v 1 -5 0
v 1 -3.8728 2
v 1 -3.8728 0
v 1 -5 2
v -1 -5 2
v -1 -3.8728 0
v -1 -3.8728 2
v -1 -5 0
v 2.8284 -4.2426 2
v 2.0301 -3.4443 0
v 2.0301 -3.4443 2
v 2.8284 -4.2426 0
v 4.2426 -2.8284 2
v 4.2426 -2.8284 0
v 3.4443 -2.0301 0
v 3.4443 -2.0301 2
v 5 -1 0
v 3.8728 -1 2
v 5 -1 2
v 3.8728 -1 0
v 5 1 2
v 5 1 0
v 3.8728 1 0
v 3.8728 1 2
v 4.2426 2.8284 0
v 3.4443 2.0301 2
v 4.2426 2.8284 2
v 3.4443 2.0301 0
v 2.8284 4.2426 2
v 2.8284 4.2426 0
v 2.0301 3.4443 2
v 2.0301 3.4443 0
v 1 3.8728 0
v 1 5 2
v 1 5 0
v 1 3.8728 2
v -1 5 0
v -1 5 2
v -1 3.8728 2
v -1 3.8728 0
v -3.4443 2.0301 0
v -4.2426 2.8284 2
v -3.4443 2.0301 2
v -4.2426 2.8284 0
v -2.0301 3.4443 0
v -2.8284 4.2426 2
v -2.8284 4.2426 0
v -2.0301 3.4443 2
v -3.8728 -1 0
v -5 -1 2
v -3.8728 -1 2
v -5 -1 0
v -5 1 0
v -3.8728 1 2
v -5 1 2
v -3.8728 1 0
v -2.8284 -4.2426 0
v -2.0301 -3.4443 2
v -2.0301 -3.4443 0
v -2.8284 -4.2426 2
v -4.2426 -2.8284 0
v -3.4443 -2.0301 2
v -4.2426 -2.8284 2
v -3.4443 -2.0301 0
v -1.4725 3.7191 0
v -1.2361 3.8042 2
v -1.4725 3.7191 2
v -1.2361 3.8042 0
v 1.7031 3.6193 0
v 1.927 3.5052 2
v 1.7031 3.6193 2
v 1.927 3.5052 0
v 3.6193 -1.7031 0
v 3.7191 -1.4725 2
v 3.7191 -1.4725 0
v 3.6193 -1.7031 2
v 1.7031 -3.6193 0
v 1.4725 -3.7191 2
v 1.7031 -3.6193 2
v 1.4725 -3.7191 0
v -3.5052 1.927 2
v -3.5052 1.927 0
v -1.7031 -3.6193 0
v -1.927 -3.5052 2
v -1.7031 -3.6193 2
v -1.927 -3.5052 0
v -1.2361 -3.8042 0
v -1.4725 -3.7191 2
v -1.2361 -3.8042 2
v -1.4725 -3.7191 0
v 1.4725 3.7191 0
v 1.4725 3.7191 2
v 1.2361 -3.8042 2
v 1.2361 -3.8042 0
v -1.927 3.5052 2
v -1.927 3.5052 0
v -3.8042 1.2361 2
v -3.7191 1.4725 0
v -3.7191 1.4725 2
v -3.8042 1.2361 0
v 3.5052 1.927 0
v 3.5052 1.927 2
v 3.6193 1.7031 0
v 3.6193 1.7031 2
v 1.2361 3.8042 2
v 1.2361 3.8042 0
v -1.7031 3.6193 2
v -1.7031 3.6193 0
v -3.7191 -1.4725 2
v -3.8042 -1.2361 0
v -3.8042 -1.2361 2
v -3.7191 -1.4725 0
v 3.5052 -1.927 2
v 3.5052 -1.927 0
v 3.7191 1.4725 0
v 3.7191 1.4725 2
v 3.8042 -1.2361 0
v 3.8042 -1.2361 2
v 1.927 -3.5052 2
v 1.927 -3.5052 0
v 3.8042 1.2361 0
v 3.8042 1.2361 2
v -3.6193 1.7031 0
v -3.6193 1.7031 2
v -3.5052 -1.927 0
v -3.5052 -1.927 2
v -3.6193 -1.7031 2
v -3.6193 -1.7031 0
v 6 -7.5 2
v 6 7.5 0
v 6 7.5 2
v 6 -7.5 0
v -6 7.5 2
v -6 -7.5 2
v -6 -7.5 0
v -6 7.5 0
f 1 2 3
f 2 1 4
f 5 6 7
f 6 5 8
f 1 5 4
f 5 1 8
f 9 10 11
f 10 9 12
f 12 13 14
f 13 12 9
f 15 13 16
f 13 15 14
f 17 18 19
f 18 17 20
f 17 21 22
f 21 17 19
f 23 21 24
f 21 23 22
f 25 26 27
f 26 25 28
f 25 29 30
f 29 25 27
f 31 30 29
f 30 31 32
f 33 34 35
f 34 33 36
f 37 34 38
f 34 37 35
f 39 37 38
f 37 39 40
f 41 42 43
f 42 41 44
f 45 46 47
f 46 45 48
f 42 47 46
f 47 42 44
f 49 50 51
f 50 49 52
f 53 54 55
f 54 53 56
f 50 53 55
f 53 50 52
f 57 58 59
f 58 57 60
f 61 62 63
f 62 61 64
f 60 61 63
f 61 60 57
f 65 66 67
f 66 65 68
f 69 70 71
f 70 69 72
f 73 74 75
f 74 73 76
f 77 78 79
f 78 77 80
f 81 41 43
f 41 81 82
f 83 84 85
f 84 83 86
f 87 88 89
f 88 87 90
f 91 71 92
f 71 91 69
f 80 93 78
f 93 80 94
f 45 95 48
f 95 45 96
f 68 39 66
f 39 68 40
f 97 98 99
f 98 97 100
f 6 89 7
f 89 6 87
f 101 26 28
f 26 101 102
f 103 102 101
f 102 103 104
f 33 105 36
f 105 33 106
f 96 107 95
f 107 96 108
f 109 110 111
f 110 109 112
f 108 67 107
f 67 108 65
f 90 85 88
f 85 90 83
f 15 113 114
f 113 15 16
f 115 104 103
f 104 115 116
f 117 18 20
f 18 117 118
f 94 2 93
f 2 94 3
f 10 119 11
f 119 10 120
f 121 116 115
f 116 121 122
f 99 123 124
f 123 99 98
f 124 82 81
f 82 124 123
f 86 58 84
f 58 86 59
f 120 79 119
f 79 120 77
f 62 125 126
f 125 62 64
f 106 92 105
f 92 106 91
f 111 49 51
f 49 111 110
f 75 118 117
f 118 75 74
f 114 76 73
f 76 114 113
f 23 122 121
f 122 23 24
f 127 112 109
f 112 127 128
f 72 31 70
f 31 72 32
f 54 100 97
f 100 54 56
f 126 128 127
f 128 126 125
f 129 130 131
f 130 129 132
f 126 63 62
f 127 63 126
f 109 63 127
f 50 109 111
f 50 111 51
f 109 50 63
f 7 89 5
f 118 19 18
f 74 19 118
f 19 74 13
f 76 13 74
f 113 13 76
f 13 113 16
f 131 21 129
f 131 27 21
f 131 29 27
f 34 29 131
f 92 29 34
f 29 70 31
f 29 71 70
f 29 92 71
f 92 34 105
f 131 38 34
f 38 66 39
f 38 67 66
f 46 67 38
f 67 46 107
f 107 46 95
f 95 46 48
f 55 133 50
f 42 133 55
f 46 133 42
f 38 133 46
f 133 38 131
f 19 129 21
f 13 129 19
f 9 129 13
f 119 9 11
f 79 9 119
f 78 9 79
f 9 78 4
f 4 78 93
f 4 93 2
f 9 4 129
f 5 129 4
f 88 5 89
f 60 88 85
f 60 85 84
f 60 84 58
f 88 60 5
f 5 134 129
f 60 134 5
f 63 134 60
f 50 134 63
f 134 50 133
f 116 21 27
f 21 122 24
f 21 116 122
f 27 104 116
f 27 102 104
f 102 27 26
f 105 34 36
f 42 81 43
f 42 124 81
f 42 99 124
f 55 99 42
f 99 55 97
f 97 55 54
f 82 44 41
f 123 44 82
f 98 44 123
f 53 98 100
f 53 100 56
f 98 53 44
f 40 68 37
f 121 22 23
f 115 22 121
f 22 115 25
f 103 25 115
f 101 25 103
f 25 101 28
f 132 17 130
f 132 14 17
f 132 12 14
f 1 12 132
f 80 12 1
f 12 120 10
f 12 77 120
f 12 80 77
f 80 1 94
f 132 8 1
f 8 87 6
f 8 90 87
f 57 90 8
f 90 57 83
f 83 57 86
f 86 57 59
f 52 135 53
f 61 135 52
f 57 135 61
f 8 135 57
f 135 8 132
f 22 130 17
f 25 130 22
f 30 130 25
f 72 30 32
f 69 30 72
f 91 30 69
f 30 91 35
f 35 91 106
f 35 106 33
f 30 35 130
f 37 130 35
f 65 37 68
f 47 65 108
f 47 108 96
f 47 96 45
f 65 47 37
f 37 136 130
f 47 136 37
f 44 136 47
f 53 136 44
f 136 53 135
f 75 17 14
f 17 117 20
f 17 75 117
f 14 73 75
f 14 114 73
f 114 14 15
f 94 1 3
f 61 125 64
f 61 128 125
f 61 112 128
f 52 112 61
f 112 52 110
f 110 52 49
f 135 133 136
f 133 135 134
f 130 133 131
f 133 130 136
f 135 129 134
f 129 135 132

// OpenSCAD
difference(){
	union(){

        translate([-6,-7.5,0]){
            cube([12,15,2], center=false);
        }
	}
	union() {

            for (hoek =[0:45:360])
            rotate([0,0,hoek]){
                translate([-1,-5,-20]){
                    rotate([0,0,0]){
                        color("red")
                        cube([2,5,40], center=false);
                    }
                }
            }




        translate([0,0,-15]){
            rotate([0,0,90]){
                color("green")
                cylinder(h=30, r=4, $fn=100, center=false);
            }
        }


	}
}
